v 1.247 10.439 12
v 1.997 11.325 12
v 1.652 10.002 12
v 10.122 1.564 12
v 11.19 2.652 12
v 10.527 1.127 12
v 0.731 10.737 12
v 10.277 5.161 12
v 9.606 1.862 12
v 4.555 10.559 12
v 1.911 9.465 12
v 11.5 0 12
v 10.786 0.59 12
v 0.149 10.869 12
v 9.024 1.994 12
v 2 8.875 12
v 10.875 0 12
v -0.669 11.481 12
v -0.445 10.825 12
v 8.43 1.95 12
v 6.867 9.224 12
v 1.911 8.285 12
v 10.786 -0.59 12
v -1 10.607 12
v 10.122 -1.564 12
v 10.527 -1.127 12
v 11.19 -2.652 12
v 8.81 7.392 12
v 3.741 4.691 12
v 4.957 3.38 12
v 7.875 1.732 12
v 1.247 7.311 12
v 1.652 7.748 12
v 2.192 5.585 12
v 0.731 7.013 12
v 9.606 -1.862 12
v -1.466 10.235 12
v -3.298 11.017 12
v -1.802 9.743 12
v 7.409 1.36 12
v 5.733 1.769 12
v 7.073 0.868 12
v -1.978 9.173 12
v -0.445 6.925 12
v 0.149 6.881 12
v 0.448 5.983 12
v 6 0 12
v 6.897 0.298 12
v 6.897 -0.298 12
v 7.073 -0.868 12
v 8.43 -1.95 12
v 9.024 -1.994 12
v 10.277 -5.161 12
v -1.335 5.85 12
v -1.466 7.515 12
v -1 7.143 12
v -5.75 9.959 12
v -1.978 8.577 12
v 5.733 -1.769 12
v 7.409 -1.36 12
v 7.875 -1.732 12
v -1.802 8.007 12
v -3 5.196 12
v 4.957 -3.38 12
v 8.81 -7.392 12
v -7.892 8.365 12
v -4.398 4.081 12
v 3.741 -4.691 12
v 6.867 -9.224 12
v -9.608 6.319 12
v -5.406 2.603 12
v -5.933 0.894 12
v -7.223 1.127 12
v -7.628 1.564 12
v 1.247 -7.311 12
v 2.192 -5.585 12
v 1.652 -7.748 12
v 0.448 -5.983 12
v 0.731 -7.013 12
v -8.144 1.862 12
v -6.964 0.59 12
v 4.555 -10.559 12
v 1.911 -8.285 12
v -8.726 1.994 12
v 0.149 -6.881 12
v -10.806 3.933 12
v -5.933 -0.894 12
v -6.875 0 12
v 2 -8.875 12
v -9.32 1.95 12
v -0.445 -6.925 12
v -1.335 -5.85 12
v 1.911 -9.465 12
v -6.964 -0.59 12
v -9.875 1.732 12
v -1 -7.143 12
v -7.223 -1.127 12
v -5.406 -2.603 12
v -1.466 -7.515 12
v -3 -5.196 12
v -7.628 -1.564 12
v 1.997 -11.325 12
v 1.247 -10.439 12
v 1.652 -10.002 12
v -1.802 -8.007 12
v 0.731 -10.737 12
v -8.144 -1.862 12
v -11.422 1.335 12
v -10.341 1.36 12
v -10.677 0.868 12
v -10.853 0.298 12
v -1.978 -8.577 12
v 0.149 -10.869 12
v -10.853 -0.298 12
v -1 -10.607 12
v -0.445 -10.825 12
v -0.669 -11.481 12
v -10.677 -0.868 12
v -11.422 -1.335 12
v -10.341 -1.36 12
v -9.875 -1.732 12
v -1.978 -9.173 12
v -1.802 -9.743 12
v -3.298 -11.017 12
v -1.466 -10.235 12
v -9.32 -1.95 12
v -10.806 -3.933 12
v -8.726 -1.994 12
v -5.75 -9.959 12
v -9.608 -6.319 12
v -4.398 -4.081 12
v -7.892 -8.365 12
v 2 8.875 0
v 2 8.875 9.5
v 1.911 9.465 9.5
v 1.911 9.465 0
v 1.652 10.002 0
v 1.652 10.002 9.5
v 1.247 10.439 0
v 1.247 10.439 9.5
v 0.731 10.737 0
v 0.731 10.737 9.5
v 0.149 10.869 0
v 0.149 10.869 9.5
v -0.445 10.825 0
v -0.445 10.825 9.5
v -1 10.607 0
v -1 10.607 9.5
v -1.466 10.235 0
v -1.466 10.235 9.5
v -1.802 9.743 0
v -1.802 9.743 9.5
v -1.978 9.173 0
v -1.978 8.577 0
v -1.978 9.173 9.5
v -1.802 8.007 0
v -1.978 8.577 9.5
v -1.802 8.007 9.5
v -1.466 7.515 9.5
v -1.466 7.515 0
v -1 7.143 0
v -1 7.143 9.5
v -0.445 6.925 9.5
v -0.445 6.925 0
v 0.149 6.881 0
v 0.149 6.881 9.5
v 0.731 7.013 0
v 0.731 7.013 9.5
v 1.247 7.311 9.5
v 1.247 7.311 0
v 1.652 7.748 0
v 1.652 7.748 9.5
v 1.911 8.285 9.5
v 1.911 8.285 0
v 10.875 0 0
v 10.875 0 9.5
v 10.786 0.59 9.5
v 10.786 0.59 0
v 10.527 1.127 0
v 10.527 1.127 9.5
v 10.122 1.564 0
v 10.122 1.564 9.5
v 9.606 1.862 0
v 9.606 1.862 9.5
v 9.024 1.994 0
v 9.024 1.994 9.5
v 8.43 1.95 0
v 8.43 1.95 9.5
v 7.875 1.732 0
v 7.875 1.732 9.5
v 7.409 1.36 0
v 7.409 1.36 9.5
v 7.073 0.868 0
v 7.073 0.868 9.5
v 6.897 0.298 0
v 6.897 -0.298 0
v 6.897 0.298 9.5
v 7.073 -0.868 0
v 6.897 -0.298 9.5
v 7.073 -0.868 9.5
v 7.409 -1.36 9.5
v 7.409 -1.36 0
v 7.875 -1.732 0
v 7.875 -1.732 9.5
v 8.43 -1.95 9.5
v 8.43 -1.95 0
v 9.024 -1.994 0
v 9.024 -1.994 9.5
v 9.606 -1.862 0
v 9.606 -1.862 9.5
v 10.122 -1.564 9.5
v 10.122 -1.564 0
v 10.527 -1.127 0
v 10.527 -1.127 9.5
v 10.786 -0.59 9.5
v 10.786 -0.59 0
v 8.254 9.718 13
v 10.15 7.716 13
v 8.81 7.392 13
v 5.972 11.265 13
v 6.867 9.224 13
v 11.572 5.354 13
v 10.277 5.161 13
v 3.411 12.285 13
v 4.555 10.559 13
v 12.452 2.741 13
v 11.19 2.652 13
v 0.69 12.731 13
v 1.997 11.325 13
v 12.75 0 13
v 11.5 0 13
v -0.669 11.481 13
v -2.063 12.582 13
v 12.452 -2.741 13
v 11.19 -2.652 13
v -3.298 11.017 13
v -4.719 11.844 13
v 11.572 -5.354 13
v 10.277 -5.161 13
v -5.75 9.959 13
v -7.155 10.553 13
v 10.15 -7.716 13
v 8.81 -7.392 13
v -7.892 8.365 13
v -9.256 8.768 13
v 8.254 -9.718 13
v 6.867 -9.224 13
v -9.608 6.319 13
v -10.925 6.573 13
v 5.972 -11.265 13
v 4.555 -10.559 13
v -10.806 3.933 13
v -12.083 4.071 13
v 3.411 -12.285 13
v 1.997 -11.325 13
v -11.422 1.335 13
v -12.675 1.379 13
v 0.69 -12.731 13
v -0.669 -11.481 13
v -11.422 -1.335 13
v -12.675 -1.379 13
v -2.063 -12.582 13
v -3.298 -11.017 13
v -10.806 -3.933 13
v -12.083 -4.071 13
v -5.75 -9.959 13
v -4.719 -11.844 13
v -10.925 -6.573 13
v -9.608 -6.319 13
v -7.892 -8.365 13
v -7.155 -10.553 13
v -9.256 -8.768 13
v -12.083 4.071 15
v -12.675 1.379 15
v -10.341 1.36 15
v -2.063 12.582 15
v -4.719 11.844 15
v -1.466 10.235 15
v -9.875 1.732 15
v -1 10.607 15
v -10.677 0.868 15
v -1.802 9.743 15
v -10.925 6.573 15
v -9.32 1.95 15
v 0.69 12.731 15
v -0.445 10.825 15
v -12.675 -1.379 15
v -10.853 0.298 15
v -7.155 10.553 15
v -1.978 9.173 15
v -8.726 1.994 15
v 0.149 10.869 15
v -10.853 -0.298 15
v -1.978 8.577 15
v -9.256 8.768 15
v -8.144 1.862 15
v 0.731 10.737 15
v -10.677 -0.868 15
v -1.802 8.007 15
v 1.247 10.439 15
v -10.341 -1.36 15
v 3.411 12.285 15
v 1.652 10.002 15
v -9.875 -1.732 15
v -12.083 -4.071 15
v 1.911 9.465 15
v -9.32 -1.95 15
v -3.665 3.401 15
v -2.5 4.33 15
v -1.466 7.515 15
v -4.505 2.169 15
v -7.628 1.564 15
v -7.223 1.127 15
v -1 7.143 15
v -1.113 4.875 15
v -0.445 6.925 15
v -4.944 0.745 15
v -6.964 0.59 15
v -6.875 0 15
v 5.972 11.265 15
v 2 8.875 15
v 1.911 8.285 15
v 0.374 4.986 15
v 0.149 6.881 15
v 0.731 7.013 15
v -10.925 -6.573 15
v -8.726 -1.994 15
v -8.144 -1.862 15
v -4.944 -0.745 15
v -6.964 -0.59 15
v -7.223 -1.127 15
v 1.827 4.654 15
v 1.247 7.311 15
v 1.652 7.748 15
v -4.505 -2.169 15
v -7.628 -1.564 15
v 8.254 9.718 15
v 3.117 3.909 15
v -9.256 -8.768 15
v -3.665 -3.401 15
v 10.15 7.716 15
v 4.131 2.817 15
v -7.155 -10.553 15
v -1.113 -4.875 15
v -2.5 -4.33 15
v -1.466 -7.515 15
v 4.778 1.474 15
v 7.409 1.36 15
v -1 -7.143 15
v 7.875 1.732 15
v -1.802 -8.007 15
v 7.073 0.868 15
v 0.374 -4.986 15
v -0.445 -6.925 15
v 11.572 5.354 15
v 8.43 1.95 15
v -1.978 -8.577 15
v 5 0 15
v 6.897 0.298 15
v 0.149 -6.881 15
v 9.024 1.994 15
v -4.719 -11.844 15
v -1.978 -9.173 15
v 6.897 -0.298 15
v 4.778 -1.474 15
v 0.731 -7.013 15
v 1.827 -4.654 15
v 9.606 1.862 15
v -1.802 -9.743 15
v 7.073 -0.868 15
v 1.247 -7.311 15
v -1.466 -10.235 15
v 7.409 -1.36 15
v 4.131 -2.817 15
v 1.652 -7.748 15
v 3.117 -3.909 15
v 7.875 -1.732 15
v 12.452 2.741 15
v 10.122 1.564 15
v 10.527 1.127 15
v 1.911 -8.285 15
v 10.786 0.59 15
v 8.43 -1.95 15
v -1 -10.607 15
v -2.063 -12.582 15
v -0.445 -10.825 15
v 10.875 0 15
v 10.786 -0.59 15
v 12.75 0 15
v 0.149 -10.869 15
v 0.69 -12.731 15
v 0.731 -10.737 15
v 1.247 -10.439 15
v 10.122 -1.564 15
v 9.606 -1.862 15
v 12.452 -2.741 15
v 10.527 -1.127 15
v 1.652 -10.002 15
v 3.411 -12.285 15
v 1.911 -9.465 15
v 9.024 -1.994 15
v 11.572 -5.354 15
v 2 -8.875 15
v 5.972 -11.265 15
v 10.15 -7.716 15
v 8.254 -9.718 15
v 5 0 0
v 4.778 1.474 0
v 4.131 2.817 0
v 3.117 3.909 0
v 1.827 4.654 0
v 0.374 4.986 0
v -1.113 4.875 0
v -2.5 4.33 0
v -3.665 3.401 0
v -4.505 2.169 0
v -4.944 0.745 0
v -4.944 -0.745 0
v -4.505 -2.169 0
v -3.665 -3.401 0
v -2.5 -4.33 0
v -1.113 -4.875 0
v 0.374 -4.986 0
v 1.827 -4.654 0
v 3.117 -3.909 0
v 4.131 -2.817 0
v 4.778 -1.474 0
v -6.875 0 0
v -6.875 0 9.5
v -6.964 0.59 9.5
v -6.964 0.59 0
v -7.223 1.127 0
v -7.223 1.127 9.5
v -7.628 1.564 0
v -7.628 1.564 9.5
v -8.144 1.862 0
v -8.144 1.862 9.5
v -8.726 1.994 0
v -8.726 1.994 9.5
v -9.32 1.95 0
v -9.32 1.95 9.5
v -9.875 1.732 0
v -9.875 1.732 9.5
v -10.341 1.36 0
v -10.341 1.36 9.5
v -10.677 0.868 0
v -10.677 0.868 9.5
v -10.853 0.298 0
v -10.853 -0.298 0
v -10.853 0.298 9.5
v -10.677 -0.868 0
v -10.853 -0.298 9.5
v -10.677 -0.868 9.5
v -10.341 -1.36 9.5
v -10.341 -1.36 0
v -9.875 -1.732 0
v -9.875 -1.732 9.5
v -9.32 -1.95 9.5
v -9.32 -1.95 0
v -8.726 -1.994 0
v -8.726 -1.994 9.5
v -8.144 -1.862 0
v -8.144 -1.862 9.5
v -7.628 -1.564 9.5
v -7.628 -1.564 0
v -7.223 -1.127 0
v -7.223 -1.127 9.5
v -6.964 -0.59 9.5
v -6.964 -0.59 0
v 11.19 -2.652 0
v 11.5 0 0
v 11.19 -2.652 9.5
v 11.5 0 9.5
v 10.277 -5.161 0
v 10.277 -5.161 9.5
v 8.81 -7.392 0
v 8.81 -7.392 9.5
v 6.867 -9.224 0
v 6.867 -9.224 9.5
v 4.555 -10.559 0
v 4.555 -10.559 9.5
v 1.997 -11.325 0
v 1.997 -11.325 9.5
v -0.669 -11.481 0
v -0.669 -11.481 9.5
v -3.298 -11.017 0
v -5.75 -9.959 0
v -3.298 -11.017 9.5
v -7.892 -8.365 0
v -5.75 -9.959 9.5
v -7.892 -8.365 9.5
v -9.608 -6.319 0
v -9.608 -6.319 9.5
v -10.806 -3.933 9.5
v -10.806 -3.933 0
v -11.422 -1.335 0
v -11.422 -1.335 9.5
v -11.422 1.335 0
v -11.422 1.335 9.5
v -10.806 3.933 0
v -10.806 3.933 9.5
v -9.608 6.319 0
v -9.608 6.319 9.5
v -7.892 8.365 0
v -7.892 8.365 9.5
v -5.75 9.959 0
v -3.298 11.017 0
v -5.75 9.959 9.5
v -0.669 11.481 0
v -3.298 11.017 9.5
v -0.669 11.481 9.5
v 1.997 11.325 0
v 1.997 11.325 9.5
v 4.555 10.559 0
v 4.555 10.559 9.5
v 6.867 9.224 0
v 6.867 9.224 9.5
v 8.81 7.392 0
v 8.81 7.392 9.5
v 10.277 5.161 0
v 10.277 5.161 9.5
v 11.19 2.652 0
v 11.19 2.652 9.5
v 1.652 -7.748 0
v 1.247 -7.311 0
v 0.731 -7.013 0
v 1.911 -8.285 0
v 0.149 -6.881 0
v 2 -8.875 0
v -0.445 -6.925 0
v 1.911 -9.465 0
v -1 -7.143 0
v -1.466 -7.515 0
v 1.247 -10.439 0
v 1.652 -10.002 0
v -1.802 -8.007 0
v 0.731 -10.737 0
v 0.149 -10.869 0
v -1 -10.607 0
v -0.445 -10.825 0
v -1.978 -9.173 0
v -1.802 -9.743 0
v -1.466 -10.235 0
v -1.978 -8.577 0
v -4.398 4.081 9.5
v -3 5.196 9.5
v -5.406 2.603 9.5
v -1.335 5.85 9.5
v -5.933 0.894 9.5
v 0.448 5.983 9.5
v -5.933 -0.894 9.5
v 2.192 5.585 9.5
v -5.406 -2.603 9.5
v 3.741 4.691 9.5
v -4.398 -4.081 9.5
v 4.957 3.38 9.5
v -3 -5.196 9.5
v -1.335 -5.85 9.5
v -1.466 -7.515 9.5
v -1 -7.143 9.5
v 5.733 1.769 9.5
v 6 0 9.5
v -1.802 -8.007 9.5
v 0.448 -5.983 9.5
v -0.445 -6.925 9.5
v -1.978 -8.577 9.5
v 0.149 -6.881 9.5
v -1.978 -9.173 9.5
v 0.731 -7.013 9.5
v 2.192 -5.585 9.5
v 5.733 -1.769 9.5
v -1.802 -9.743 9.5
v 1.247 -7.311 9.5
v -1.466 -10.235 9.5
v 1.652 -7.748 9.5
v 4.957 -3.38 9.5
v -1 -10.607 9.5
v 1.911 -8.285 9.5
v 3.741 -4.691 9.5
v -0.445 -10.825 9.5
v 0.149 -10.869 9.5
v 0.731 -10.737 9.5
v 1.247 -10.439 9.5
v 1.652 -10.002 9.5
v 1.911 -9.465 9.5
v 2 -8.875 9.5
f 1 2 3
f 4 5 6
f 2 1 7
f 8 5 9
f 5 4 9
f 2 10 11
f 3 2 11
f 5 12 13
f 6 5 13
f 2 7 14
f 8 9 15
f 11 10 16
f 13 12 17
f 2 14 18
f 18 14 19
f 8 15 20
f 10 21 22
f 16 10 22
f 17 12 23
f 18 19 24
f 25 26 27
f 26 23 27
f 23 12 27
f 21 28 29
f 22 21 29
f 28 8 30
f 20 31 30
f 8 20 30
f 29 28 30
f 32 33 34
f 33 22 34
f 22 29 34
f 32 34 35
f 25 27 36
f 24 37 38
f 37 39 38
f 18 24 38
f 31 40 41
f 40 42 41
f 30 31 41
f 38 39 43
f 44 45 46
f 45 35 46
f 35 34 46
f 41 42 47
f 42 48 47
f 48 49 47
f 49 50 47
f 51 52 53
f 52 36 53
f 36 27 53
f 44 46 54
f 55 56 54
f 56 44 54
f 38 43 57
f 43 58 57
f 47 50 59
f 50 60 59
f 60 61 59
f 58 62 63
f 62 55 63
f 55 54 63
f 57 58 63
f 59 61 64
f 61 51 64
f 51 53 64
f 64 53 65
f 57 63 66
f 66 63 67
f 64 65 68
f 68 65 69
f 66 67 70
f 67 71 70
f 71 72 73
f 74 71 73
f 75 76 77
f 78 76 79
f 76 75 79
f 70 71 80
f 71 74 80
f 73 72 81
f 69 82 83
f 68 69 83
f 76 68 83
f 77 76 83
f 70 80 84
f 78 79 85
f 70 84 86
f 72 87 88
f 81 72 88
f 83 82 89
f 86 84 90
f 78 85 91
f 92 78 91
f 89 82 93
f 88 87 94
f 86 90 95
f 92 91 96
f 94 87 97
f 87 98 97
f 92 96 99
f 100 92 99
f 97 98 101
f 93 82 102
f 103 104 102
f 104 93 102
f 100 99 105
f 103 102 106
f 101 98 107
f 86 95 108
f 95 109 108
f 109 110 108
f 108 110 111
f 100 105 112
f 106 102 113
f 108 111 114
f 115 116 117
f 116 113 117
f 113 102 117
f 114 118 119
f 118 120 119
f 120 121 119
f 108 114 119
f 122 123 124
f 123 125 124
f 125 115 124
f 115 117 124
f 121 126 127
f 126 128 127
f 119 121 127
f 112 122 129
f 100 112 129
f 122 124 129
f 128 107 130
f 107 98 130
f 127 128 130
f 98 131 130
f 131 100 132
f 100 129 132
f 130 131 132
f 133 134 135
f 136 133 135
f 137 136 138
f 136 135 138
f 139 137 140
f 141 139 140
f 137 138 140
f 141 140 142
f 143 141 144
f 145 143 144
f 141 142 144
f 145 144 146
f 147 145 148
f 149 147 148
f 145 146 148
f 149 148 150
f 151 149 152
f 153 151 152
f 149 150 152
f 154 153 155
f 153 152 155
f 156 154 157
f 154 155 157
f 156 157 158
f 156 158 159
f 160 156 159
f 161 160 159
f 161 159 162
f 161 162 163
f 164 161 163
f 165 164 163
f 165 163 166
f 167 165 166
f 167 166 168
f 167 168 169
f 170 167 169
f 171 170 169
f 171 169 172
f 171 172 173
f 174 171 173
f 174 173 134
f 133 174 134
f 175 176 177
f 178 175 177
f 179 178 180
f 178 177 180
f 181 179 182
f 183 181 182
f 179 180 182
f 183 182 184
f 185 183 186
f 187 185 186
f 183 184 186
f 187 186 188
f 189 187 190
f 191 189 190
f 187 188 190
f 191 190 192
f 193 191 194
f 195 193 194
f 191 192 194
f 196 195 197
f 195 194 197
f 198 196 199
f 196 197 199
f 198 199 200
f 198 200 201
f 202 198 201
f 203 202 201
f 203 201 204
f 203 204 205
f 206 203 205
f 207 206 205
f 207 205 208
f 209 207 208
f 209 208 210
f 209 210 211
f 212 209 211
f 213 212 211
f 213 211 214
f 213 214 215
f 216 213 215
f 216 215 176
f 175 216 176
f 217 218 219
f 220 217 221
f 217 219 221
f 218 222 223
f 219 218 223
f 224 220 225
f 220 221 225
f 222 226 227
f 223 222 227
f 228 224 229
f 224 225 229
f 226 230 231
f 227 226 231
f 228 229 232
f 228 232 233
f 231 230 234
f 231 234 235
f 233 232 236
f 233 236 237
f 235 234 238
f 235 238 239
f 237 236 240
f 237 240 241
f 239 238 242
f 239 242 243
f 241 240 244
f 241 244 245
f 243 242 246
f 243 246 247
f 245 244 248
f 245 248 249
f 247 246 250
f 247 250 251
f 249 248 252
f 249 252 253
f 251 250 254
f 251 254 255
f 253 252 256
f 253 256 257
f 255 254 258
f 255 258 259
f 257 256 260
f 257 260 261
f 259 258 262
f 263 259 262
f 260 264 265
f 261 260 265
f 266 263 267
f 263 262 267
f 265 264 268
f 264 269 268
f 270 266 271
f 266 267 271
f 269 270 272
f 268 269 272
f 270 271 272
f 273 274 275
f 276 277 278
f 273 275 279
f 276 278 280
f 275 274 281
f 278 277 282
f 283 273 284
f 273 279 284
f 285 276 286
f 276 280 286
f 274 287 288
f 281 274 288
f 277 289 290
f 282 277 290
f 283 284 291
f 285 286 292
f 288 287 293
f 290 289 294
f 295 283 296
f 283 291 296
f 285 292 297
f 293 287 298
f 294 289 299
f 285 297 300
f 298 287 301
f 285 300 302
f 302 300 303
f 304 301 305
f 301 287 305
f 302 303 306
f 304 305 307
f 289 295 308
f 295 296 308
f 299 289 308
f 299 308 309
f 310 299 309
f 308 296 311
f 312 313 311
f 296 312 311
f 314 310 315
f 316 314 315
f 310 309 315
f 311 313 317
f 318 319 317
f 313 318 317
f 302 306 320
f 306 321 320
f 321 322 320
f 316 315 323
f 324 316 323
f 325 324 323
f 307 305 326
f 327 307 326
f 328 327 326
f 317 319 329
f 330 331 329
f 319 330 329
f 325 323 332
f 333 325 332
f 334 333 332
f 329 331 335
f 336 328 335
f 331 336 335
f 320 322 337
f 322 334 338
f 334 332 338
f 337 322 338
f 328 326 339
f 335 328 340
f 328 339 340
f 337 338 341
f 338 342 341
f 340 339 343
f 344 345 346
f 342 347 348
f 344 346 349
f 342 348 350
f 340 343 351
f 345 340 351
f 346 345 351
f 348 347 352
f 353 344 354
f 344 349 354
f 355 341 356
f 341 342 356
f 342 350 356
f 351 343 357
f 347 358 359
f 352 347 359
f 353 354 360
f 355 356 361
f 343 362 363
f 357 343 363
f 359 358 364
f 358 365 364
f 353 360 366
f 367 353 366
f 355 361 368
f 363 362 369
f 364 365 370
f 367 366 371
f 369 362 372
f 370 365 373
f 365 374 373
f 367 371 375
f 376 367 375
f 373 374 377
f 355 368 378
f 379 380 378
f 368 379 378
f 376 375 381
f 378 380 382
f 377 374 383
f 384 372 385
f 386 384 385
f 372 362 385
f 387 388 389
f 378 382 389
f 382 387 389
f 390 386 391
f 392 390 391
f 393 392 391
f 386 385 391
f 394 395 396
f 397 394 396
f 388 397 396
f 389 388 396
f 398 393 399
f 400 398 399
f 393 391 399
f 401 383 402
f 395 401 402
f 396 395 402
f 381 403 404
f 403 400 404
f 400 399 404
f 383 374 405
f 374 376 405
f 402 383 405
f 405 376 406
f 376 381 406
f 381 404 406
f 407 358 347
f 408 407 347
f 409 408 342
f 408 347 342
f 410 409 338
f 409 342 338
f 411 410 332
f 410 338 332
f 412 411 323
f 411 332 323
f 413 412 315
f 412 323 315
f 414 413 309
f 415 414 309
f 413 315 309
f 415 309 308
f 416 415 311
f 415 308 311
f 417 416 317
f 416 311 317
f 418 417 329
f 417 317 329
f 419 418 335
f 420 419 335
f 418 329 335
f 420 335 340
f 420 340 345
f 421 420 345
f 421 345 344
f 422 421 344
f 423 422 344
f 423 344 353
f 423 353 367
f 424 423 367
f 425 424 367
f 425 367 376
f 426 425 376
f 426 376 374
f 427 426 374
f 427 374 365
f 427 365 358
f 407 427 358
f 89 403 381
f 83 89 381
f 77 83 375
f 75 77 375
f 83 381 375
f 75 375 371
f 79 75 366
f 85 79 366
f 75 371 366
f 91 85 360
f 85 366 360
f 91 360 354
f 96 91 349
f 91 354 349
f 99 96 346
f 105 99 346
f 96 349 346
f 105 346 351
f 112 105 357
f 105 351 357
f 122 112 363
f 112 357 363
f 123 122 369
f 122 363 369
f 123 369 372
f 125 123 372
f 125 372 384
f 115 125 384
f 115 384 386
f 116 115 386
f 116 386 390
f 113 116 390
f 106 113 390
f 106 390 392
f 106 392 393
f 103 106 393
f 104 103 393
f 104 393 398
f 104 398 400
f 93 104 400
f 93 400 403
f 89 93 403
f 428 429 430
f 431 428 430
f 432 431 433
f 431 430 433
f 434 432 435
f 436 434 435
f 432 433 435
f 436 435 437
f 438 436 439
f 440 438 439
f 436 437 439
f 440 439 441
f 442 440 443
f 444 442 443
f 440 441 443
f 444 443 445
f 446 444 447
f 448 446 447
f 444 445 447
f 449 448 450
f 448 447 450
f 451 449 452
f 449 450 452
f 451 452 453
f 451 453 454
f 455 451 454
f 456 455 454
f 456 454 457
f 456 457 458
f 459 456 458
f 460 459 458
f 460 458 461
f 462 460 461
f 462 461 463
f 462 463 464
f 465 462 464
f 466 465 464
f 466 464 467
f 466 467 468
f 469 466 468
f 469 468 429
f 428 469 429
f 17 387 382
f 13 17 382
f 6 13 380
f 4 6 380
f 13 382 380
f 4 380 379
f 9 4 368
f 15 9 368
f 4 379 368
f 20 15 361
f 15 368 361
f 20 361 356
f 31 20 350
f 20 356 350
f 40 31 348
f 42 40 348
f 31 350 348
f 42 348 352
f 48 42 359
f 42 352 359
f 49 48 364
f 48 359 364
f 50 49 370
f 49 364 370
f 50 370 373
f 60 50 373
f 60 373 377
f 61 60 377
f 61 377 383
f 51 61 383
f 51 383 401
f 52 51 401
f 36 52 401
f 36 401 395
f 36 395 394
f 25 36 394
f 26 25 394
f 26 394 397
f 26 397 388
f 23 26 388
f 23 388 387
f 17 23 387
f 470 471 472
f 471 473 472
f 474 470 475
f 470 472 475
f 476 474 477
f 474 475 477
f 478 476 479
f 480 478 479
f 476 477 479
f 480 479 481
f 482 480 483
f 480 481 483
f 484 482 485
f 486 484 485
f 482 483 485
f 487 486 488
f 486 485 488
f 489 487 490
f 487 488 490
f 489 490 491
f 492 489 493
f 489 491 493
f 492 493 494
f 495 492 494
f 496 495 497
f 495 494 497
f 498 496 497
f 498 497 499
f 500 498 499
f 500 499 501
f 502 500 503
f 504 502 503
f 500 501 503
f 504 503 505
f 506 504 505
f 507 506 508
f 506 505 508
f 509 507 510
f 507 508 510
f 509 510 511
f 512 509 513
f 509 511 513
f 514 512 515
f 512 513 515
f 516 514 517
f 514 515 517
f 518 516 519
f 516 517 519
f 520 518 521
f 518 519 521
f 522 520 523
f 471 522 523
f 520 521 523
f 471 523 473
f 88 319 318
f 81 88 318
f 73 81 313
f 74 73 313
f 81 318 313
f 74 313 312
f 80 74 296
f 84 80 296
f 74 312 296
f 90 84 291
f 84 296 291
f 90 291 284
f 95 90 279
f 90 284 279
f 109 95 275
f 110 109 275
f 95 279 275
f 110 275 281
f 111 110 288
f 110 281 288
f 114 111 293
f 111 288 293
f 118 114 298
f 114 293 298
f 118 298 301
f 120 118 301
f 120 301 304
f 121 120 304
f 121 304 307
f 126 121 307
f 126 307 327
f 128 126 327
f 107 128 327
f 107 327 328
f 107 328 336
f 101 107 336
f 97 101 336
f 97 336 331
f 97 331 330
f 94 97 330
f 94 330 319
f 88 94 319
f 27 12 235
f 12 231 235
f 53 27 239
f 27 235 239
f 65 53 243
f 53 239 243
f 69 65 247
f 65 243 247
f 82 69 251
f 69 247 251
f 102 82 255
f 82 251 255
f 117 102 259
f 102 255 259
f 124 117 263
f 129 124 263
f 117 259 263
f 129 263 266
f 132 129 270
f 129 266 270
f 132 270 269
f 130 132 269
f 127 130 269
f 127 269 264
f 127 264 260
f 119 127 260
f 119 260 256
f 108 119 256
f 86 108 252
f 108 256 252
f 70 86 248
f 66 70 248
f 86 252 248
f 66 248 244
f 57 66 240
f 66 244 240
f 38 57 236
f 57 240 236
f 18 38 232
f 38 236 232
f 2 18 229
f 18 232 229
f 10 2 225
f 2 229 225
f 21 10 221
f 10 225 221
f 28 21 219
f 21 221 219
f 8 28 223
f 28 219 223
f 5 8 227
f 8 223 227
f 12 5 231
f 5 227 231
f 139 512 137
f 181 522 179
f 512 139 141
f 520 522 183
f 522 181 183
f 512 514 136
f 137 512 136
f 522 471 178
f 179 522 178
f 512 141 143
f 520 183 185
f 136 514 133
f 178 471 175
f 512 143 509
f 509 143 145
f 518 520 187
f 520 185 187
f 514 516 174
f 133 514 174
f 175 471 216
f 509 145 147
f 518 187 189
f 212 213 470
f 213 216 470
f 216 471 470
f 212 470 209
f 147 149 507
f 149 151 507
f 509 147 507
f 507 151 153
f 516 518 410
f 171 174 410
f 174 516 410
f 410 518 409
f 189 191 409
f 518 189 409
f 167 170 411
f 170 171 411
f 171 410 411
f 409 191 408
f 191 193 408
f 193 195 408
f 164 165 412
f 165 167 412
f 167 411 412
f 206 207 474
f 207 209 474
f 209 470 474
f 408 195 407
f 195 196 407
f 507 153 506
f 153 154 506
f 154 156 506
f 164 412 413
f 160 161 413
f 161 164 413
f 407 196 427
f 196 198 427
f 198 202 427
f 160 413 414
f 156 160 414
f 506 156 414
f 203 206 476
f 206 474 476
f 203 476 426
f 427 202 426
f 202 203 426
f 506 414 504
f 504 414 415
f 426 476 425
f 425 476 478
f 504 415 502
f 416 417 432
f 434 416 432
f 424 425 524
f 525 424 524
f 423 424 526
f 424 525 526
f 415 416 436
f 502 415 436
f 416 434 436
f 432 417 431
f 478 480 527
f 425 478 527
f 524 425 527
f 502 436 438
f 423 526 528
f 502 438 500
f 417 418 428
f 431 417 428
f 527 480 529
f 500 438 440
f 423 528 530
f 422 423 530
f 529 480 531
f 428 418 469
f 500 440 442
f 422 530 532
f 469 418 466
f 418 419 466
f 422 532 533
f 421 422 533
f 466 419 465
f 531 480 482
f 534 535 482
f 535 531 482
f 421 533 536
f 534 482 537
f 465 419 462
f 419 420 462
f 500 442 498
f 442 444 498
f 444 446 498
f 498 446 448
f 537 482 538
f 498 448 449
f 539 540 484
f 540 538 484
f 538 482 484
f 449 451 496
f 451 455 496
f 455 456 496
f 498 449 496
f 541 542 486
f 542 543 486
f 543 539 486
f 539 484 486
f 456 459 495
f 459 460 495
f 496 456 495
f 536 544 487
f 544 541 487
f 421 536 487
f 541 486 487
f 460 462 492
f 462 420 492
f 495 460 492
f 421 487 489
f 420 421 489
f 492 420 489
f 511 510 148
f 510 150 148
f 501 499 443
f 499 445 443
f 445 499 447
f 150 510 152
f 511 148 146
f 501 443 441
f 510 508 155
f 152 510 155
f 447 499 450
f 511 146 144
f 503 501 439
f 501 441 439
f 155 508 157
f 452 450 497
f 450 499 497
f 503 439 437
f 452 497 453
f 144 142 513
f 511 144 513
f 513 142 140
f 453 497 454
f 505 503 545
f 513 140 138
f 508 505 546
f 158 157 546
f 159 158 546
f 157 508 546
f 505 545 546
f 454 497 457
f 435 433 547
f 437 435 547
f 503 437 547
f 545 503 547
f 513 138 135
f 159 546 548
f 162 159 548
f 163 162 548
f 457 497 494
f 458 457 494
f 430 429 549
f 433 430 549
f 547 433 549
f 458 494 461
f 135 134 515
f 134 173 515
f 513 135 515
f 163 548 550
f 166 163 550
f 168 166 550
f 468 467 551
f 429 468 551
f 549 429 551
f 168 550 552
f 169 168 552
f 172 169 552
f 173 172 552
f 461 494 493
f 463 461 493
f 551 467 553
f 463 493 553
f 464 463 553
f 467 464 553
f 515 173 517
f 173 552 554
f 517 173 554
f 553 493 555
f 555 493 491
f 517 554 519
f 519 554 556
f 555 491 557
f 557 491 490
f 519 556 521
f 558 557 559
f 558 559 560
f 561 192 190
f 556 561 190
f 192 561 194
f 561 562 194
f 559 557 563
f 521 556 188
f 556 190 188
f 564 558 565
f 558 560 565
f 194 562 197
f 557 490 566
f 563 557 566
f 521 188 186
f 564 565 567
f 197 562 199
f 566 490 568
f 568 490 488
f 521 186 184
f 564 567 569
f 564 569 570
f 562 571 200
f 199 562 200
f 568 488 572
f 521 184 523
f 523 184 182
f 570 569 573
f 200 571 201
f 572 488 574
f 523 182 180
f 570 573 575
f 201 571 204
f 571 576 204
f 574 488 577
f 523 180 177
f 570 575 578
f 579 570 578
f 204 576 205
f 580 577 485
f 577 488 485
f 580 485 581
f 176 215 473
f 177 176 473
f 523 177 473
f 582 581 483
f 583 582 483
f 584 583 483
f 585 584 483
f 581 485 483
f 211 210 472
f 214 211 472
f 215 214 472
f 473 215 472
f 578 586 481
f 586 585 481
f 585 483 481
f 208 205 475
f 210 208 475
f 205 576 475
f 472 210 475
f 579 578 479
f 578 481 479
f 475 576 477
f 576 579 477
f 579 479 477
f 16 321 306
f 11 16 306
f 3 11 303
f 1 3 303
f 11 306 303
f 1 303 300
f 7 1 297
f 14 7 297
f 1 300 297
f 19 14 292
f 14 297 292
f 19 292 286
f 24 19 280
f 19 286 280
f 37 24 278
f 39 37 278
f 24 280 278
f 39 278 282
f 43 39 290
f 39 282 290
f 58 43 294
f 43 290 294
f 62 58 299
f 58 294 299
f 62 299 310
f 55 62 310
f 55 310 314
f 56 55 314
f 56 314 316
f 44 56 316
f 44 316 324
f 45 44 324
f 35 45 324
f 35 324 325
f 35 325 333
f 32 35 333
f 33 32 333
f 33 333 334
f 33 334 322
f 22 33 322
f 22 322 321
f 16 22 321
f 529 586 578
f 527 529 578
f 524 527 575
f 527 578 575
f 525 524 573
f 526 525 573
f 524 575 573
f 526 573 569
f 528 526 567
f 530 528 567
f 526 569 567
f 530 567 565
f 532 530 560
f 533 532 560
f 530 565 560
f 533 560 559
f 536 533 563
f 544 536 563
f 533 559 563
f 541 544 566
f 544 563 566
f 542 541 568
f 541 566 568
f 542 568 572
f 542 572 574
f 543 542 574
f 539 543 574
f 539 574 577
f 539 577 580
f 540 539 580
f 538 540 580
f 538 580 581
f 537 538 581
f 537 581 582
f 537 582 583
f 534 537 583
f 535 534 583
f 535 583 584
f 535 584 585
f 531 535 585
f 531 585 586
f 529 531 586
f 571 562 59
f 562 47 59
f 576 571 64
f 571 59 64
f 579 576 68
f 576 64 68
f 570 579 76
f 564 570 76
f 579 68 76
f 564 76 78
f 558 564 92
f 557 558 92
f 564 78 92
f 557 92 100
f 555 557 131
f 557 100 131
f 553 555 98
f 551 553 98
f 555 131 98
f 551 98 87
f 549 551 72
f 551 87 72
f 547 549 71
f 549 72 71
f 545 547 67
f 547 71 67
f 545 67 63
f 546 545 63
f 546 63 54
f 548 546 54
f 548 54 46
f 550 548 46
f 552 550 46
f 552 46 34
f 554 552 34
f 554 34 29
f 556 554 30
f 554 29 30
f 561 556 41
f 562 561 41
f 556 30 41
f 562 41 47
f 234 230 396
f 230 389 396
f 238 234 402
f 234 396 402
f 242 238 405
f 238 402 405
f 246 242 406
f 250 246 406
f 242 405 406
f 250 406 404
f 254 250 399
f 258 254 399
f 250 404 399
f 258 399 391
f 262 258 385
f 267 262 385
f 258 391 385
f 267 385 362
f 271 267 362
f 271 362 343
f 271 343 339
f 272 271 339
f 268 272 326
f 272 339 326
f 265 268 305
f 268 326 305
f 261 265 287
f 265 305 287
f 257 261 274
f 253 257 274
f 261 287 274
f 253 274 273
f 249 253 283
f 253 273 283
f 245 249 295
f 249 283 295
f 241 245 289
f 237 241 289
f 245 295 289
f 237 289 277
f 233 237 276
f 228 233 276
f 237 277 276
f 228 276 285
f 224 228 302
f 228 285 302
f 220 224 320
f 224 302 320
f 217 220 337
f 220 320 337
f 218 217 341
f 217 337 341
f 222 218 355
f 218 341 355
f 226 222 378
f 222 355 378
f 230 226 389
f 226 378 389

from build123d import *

# Parameters (mm, degrees)
SKETCH2_R          = 5
CUT_EXTRUDE1_DEPTH = 24.454743657
SKETCH3_R          = 2
CUT_EXTRUDE2_DEPTH = 24.454743657


with BuildPart() as part:
    # Sketch1 → Revolve1 (revolve)
    with BuildSketch(Plane(origin=(0, 0, 0), x_dir=(0, 0, -1), z_dir=(1, 0, 0)), mode=Mode.PRIVATE) as revolve1_sk:
        Polygon((0, 0), (0, 11.5), (-9.5, 11.5), (-9.5, 6), (-12, 6), (-12, 11.5), (-13, 11.5), (-13, 12.75), (-15, 12.75), (-15, 0), align=None)
    revolve(revolve1_sk.sketch.rotate(Axis((0, 0, 15), (0, 0, -1)), 90), axis=Axis((0, 0, 15), (0, 0, -1)))

    # Sketch2 → Cut-Extrude1 (cut, through all)
    with BuildSketch(Plane.XY.offset(15)):
        Circle(SKETCH2_R)
    extrude(amount=-CUT_EXTRUDE1_DEPTH, mode=Mode.SUBTRACT)

    # Sketch3 → Cut-Extrude2 (cut, through all)
    with BuildSketch(Plane.XY.offset(15)):
        with Locations((0, 8.875)):
            Circle(SKETCH3_R)
        with Locations((8.875, 0)):
            Circle(SKETCH3_R)
        with Locations((0, -8.875)):
            Circle(SKETCH3_R)
        with Locations((-8.875, 0)):
            Circle(SKETCH3_R)
    extrude(amount=-CUT_EXTRUDE2_DEPTH, mode=Mode.SUBTRACT)


solid = part.part
